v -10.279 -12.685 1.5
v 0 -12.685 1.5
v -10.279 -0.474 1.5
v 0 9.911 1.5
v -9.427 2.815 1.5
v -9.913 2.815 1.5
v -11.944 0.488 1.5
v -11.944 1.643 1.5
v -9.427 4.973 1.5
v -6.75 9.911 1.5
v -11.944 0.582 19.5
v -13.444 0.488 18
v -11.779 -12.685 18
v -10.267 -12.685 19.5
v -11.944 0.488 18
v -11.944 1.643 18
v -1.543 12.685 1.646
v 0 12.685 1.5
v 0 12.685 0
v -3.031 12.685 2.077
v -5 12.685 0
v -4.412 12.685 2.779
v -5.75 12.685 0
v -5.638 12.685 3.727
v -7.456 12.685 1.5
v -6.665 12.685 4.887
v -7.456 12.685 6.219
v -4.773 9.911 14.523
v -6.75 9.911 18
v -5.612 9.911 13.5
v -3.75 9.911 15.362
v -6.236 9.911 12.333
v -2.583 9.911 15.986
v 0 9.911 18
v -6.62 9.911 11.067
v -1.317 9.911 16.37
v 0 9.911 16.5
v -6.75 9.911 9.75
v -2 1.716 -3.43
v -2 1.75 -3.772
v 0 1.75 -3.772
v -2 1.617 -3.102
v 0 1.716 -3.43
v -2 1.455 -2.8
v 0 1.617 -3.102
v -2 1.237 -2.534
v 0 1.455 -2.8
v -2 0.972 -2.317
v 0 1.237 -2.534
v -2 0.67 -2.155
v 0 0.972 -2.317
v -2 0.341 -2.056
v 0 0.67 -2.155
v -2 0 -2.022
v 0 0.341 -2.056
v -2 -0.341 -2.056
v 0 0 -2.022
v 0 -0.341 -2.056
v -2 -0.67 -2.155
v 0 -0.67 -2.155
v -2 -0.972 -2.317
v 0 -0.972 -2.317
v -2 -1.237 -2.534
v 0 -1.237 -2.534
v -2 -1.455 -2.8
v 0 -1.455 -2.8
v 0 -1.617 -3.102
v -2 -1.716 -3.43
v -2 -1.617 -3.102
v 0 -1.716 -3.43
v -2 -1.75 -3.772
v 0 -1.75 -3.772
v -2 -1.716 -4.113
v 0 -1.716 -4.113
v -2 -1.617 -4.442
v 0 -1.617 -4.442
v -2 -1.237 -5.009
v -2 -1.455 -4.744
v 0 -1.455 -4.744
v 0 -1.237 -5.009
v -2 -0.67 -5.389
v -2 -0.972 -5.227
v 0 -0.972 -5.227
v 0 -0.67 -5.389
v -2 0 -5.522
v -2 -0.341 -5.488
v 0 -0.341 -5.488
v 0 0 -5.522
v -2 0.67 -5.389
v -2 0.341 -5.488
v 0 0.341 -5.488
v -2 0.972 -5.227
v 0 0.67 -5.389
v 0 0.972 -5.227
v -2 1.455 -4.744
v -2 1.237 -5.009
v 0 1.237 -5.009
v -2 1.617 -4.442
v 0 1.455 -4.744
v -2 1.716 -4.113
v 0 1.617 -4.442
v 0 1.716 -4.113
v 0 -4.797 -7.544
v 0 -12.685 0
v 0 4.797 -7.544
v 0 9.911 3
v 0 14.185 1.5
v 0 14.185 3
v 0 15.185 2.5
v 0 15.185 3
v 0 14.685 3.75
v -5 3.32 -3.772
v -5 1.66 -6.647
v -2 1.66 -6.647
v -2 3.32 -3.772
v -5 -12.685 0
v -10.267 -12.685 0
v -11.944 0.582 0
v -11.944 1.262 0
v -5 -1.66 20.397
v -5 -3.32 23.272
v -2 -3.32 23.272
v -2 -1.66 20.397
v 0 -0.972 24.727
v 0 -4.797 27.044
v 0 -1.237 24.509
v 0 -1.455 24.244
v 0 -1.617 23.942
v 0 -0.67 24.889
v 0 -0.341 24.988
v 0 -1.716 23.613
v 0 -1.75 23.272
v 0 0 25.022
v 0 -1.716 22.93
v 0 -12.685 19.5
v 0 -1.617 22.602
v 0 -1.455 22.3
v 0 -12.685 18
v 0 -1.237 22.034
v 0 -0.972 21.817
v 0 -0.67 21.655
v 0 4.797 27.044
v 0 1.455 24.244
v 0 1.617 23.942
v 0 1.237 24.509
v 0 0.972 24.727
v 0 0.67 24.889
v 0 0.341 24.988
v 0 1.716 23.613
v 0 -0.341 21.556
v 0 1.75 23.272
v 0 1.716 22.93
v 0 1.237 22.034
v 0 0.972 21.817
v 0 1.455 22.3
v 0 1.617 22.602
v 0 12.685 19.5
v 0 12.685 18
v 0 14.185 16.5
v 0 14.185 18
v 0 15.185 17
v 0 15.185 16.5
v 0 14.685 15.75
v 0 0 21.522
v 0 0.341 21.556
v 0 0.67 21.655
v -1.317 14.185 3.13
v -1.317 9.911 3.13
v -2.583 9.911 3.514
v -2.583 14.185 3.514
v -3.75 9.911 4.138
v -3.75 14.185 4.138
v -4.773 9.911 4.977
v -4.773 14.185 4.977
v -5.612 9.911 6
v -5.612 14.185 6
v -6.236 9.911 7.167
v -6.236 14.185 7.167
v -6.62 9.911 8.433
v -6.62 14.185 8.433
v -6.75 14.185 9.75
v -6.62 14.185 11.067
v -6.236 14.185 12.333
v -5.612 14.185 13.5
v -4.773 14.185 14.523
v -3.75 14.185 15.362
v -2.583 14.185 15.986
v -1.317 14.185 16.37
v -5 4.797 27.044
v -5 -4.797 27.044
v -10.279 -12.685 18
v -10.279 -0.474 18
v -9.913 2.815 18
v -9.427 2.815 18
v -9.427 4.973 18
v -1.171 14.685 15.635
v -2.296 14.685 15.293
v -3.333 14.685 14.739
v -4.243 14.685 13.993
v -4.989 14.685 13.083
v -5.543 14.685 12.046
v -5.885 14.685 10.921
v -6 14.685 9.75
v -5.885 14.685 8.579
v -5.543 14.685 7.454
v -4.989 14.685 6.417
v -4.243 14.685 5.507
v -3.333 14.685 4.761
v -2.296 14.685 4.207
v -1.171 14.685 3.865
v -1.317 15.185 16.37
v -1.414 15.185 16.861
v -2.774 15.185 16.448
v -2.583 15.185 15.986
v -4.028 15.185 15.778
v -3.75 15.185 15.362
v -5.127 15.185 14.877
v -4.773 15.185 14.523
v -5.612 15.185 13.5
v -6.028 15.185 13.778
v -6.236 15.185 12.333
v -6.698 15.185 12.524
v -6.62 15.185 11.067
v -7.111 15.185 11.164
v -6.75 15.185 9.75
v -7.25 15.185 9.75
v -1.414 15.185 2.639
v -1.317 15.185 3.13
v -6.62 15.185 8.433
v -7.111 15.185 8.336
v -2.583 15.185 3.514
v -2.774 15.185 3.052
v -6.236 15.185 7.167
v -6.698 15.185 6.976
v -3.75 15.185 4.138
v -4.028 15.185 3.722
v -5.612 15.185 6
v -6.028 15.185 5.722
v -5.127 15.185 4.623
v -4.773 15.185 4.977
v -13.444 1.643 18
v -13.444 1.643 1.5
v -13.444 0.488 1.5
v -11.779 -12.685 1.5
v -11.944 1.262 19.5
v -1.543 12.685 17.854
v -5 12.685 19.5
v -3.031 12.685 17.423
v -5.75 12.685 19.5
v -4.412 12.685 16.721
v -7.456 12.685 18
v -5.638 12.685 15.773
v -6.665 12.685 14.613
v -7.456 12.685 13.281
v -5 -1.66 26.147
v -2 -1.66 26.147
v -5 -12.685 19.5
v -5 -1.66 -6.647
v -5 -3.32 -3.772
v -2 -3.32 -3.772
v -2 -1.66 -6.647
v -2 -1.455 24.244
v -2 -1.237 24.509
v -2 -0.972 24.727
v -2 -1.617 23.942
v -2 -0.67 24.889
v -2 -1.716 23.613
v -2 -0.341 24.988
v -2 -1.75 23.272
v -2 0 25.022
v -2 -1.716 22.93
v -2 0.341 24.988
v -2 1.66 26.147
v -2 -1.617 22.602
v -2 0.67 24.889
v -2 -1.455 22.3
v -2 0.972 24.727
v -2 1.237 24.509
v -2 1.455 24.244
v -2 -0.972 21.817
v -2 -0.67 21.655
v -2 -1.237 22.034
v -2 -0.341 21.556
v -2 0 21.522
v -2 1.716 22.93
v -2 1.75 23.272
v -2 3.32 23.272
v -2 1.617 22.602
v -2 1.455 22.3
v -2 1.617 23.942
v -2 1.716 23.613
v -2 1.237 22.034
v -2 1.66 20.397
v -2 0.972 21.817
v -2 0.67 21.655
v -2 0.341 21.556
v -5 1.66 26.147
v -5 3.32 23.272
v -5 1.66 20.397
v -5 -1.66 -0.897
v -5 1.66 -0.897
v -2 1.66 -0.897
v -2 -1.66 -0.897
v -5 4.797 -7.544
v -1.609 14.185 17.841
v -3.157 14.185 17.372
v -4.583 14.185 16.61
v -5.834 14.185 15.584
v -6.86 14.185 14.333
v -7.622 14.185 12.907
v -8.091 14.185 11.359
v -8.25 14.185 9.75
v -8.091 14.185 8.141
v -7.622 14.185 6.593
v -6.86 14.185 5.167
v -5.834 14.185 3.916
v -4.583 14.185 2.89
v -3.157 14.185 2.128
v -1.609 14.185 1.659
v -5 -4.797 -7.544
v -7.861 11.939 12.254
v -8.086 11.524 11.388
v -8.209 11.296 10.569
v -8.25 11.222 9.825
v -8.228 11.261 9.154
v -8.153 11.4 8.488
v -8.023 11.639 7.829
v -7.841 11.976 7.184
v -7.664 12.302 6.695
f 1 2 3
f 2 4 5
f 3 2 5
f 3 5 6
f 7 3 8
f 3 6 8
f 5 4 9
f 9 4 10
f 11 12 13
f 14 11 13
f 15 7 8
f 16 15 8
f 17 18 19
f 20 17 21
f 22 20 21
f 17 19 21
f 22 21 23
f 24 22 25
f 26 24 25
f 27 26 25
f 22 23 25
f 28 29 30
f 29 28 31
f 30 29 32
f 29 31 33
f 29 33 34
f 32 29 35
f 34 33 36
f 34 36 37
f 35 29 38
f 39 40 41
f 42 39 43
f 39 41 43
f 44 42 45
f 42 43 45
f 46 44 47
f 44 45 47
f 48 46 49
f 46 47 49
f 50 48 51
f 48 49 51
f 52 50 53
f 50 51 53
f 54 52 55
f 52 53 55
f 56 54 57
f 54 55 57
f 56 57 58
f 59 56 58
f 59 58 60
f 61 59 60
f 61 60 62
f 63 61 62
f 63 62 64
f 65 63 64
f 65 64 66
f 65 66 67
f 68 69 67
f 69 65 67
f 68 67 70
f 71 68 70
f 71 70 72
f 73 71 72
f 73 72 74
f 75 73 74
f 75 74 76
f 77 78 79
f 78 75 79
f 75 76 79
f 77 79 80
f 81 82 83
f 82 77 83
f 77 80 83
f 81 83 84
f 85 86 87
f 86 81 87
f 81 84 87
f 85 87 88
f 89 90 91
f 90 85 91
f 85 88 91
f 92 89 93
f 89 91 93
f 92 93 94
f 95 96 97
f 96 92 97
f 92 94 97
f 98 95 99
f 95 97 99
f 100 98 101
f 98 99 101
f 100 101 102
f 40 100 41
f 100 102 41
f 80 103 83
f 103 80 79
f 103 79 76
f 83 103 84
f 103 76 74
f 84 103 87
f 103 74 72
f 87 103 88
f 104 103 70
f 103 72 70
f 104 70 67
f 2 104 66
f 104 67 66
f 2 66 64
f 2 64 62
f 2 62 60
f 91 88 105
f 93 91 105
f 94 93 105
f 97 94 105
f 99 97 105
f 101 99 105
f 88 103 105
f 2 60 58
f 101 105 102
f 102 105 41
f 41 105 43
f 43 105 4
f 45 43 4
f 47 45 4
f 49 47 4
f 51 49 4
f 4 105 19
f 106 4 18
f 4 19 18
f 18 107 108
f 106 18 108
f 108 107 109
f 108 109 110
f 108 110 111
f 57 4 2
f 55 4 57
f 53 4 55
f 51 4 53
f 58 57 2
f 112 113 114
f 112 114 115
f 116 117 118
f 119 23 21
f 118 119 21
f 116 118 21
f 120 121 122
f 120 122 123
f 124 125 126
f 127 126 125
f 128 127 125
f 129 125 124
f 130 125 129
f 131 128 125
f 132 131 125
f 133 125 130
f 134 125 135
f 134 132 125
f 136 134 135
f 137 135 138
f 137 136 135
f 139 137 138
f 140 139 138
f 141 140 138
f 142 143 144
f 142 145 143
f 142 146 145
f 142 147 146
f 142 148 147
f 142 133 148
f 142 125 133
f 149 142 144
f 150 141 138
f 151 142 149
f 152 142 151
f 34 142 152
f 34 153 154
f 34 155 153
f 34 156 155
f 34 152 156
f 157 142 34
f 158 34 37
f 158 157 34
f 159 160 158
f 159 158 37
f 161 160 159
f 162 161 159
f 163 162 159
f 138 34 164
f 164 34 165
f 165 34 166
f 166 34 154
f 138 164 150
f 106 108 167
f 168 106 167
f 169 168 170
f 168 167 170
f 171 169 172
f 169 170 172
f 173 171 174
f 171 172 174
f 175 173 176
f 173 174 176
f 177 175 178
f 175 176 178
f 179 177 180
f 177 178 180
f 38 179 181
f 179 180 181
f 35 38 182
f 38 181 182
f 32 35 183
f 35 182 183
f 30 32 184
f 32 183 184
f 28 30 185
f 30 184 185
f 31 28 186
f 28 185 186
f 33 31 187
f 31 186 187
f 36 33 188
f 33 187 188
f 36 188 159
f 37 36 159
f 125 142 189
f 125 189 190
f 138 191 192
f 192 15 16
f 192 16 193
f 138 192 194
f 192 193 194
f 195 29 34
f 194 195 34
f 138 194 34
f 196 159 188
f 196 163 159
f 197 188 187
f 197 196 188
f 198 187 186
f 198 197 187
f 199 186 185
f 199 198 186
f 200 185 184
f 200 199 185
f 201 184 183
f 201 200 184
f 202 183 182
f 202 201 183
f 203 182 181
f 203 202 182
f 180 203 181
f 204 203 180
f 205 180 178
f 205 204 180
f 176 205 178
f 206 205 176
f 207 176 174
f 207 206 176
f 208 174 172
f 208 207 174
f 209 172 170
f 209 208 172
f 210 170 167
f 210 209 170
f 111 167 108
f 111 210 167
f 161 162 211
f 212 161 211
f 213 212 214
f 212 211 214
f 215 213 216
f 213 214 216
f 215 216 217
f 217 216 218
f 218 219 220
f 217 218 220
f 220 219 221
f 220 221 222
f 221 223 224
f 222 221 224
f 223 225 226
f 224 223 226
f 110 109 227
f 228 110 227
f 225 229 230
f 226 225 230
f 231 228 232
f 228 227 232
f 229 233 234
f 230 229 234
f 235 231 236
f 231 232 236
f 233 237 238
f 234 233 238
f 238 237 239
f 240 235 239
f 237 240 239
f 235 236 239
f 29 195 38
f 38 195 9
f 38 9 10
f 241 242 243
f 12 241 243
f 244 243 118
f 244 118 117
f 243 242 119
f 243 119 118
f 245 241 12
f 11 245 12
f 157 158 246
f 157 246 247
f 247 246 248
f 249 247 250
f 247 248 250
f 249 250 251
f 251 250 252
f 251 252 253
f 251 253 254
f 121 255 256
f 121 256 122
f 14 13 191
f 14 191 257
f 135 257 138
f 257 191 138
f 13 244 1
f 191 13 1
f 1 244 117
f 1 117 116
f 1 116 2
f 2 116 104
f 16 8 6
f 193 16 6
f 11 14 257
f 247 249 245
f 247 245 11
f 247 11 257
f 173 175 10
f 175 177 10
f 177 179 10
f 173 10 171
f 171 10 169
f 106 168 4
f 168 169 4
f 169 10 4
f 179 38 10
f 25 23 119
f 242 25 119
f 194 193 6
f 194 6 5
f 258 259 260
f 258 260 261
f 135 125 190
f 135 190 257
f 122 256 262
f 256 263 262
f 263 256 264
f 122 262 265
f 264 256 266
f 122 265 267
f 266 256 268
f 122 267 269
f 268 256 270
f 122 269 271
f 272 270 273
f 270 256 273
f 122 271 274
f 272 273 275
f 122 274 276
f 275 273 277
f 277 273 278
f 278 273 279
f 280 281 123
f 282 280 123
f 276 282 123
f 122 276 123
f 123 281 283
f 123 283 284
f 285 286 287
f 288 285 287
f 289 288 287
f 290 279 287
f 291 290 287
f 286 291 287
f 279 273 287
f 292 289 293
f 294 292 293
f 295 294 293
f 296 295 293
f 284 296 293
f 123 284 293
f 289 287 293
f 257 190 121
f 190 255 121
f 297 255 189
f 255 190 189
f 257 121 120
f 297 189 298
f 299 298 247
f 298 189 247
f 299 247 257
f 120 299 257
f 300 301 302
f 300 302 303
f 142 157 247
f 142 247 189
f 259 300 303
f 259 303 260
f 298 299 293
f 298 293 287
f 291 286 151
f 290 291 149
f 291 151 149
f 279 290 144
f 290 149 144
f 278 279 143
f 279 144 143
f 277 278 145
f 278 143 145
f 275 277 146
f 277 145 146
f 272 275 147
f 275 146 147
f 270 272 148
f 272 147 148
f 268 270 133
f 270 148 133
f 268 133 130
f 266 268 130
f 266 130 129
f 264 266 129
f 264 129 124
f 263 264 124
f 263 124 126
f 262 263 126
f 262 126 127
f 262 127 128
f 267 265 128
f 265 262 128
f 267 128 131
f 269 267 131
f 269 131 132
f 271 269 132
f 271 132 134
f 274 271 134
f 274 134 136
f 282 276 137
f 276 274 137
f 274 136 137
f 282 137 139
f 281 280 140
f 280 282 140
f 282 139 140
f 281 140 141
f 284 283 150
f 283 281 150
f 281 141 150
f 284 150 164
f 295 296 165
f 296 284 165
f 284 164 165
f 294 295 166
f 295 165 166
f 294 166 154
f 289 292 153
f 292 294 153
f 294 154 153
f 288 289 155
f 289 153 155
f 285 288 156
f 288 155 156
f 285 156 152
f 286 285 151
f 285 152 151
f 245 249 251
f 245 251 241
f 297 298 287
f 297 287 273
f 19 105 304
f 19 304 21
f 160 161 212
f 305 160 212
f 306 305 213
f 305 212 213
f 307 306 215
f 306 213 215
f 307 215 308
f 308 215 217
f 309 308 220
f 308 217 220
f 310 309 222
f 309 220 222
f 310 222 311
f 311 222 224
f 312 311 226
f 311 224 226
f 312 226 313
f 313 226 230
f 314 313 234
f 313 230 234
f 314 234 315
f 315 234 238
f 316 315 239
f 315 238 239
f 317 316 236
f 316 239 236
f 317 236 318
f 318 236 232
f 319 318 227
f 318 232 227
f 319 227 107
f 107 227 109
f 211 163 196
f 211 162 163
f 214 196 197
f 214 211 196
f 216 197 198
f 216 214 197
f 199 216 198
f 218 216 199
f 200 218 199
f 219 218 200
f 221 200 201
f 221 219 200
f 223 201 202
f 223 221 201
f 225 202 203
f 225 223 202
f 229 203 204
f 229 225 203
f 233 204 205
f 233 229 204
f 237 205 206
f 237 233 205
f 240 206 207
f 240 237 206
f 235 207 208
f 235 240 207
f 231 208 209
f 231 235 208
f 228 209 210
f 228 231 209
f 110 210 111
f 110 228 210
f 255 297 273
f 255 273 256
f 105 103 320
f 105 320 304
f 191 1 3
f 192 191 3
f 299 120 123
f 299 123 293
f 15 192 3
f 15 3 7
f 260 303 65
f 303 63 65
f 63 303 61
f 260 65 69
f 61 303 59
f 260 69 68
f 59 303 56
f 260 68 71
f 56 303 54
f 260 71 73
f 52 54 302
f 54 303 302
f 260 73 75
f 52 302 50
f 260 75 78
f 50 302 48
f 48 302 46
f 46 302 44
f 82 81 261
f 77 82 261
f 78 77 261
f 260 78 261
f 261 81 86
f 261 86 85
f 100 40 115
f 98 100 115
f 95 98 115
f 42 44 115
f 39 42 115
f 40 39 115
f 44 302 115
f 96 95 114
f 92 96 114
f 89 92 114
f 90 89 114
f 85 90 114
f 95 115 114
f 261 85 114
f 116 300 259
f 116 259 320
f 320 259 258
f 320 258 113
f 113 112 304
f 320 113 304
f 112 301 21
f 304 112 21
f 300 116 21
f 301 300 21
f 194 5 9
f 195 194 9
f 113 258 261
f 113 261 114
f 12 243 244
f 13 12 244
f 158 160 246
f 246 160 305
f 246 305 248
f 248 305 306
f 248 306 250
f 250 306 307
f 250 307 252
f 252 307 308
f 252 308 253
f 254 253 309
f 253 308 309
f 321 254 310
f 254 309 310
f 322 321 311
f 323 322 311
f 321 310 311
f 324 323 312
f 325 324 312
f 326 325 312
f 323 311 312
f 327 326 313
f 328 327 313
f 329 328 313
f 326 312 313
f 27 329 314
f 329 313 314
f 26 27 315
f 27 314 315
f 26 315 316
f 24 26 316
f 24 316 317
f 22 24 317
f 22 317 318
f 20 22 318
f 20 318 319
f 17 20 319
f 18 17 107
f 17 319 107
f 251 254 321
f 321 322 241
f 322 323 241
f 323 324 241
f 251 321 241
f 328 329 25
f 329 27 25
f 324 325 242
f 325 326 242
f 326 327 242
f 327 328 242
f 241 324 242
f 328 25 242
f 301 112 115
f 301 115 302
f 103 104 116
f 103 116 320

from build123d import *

# Parameters (mm, degrees)
BOSS_EXTRUDE1_DEPTH = 19.5
BOSS_EXTRUDE5_DEPTH = 1.5
BOSS_EXTRUDE6_DEPTH = 1.5
SKETCH8_R           = 6.75
CUT_EXTRUDE2_DEPTH  = 35.70752685
BOSS_EXTRUDE7_DEPTH = 2.5
SKETCH10_R          = 1.75
BOSS_EXTRUDE8_DEPTH = 5
CHAMFER1_SIZE       = 1.5
SKETCH11_R          = 1.75
CUT_EXTRUDE3_DEPTH  = 3
CHAMFER2_SIZE       = 1
REVOLVE1_ANGLE      = 180


with BuildPart() as part:
    # Sketch1 → Boss-Extrude1 (new body)
    with BuildSketch(Plane.XY):
        Polygon((-11.779, -12.684829289), (-10.279, -12.684829289), (-10.279, -0.473504424), (-11.944063509, 0.487820441), (-11.944063509, 1.64252098), (-9.912974596, 2.815170711), (-9.427494989, 2.815170711), (-9.427494989, 4.973204454), (-6.75, 9.910826582), (0, 9.910826582), (0, 12.684829289), (-7.456216647, 12.684829289), (-13.444063509, 1.64252098), (-13.444063509, 0.487820441), align=None)
    extrude(amount=BOSS_EXTRUDE1_DEPTH)

    # Sketch6 → Boss-Extrude5 (add)
    with BuildSketch(Plane.XY.offset(19.5)):
        Polygon((0, 12.684829289), (-7.456216647, 12.684829289), (-13.444063509, 1.64252098), (-13.444063509, 0.487820441), (-11.779, -12.684829289), (0, -12.684829289), align=None)
    extrude(amount=-BOSS_EXTRUDE5_DEPTH)

    # Sketch7 → Boss-Extrude6 (add)
    with BuildSketch(Plane(origin=(0, 0, 0), x_dir=(-1, 0, 0), z_dir=(0, 0, -1))):
        Polygon((0, 12.684829289), (0, -12.684829289), (11.779, -12.684829289), (13.444063509, 0.487820441), (13.444063509, 1.64252098), (7.456216647, 12.684829289), align=None)
    extrude(amount=-BOSS_EXTRUDE6_DEPTH)

    # Sketch8 → Cut-Extrude2 (cut, through all)
    with BuildSketch(Plane(origin=(0, 12.684829289, 0), x_dir=(1, 0, 0), z_dir=(0, 1, 0))):
        with Locations((0, -9.75)):
            Circle(SKETCH8_R)
    extrude(amount=-CUT_EXTRUDE2_DEPTH, mode=Mode.SUBTRACT)

    # Sketch9 → Boss-Extrude7 (add, symmetric)
    with BuildSketch(Plane(origin=(0, 12.684829289, 0), x_dir=(1, 0, 0), z_dir=(0, 1, 0))):
        with BuildLine():
            Line((0, -1.5), (0, -3))
            ThreePointArc((0, -3), (-6.75, -9.75), (0, -16.5))
            Line((0, -16.5), (0, -18))
            ThreePointArc((0, -18), (-8.25, -9.75), (0, -1.5))
        make_face()
    extrude(amount=BOSS_EXTRUDE7_DEPTH, both=True)

    # Sketch10 → Boss-Extrude8 (add)
    with BuildSketch(Plane(origin=(0, 0, 0), x_dir=(0, 0, -1), z_dir=(1, 0, 0))):
        Polygon((-19.5, 12.684829289), (-27.043783602, 4.79693847), (-27.043783602, -4.79693847), (-19.5, -12.684829289), align=None)
        Polygon((-20.396891801, -1.659882024), (-20.396891801, 1.659882024), (-23.271891801, 3.319764048), (-26.146891801, 1.659882024), (-26.146891801, -1.659882024), (-23.271891801, -3.319764048), align=None, mode=Mode.SUBTRACT)
        Polygon((-23.271891801, -3.319764048), (-20.396891801, -1.659882024), (-20.396891801, 1.659882024), (-23.271891801, 3.319764048), (-26.146891801, 1.659882024), (-26.146891801, -1.659882024), align=None)
        with Locations(Location((-23.271891801, 0, 0), (0, 0, 90))):
            Circle(SKETCH10_R, mode=Mode.SUBTRACT)
        Polygon((7.543783602, 4.79693847), (0, 12.684829289), (0, -12.684829289), (7.543783602, -4.79693847), align=None)
        Polygon((6.646891801, 1.659882024), (3.771891801, 3.319764048), (0.896891801, 1.659882024), (0.896891801, -1.659882024), (3.771891801, -3.319764048), (6.646891801, -1.659882024), align=None, mode=Mode.SUBTRACT)
        Polygon((6.646891801, 1.659882024), (6.646891801, -1.659882024), (3.771891801, -3.319764048), (0.896891801, -1.659882024), (0.896891801, 1.659882024), (3.771891801, 3.319764048), align=None)
        with Locations(Location((3.771891801, 0, 0), (0, 0, 90))):
            Circle(SKETCH10_R, mode=Mode.SUBTRACT)
    extrude(amount=-BOSS_EXTRUDE8_DEPTH)

    # Chamfer1
    chamfer1_edges = [part.edges().sort_by_distance(p)[0] for p in [
        (-12.611531755, -6.098504424, 19.5),
        (-13.444063509, 1.065170711, 19.5),
        (-10.450140078, 7.163675135, 19.5),
        (-12.611531755, -6.098504424, 0),
        (-13.444063509, 1.065170711, 0),
        (-10.450140078, 7.163675135, 0),
    ]]
    chamfer(chamfer1_edges, length=CHAMFER1_SIZE)

    # Sketch11 → Cut-Extrude3 (cut)
    with BuildSketch(Plane.ZY.offset(5)):
        Polygon((-6.646891801, 1.659882024), (-3.771891801, 3.319764048), (-0.896891801, 1.659882024), (-0.896891801, -1.659882024), (-3.771891801, -3.319764048), (-6.646891801, -1.659882024), align=None)
        with Locations(Location((-3.771891801, 0, 0), (0, 0, 90))):
            Circle(SKETCH11_R, mode=Mode.SUBTRACT)
        Polygon((20.396891801, 1.659882024), (23.271891801, 3.319764048), (26.146891801, 1.659882024), (26.146891801, -1.659882024), (23.271891801, -3.319764048), (20.396891801, -1.659882024), align=None)
        with Locations(Location((23.271891801, 0, 0), (0, 0, 90))):
            Circle(SKETCH11_R, mode=Mode.SUBTRACT)
    extrude(amount=-CUT_EXTRUDE3_DEPTH, mode=Mode.SUBTRACT)

    # Chamfer2
    chamfer2_edges = [part.edges().sort_by_distance(p)[0] for p in [
        (-8.25, 15.184829289, 9.75),
    ]]
    chamfer(chamfer2_edges, length=CHAMFER2_SIZE)

    # Sketch12 → Revolve1 (revolve)
    with BuildSketch(Plane(origin=(0, 0, 0), x_dir=(0, 0, -1), z_dir=(1, 0, 0))):
        Polygon((-16.5, 15.184829289), (-16.5, 14.184829289), (-15.75, 14.684829289), align=None)
    revolve(axis=Axis((0, 15.184829289, 9.75), (0, -1, 0)), revolution_arc=REVOLVE1_ANGLE)


solid = part.part
